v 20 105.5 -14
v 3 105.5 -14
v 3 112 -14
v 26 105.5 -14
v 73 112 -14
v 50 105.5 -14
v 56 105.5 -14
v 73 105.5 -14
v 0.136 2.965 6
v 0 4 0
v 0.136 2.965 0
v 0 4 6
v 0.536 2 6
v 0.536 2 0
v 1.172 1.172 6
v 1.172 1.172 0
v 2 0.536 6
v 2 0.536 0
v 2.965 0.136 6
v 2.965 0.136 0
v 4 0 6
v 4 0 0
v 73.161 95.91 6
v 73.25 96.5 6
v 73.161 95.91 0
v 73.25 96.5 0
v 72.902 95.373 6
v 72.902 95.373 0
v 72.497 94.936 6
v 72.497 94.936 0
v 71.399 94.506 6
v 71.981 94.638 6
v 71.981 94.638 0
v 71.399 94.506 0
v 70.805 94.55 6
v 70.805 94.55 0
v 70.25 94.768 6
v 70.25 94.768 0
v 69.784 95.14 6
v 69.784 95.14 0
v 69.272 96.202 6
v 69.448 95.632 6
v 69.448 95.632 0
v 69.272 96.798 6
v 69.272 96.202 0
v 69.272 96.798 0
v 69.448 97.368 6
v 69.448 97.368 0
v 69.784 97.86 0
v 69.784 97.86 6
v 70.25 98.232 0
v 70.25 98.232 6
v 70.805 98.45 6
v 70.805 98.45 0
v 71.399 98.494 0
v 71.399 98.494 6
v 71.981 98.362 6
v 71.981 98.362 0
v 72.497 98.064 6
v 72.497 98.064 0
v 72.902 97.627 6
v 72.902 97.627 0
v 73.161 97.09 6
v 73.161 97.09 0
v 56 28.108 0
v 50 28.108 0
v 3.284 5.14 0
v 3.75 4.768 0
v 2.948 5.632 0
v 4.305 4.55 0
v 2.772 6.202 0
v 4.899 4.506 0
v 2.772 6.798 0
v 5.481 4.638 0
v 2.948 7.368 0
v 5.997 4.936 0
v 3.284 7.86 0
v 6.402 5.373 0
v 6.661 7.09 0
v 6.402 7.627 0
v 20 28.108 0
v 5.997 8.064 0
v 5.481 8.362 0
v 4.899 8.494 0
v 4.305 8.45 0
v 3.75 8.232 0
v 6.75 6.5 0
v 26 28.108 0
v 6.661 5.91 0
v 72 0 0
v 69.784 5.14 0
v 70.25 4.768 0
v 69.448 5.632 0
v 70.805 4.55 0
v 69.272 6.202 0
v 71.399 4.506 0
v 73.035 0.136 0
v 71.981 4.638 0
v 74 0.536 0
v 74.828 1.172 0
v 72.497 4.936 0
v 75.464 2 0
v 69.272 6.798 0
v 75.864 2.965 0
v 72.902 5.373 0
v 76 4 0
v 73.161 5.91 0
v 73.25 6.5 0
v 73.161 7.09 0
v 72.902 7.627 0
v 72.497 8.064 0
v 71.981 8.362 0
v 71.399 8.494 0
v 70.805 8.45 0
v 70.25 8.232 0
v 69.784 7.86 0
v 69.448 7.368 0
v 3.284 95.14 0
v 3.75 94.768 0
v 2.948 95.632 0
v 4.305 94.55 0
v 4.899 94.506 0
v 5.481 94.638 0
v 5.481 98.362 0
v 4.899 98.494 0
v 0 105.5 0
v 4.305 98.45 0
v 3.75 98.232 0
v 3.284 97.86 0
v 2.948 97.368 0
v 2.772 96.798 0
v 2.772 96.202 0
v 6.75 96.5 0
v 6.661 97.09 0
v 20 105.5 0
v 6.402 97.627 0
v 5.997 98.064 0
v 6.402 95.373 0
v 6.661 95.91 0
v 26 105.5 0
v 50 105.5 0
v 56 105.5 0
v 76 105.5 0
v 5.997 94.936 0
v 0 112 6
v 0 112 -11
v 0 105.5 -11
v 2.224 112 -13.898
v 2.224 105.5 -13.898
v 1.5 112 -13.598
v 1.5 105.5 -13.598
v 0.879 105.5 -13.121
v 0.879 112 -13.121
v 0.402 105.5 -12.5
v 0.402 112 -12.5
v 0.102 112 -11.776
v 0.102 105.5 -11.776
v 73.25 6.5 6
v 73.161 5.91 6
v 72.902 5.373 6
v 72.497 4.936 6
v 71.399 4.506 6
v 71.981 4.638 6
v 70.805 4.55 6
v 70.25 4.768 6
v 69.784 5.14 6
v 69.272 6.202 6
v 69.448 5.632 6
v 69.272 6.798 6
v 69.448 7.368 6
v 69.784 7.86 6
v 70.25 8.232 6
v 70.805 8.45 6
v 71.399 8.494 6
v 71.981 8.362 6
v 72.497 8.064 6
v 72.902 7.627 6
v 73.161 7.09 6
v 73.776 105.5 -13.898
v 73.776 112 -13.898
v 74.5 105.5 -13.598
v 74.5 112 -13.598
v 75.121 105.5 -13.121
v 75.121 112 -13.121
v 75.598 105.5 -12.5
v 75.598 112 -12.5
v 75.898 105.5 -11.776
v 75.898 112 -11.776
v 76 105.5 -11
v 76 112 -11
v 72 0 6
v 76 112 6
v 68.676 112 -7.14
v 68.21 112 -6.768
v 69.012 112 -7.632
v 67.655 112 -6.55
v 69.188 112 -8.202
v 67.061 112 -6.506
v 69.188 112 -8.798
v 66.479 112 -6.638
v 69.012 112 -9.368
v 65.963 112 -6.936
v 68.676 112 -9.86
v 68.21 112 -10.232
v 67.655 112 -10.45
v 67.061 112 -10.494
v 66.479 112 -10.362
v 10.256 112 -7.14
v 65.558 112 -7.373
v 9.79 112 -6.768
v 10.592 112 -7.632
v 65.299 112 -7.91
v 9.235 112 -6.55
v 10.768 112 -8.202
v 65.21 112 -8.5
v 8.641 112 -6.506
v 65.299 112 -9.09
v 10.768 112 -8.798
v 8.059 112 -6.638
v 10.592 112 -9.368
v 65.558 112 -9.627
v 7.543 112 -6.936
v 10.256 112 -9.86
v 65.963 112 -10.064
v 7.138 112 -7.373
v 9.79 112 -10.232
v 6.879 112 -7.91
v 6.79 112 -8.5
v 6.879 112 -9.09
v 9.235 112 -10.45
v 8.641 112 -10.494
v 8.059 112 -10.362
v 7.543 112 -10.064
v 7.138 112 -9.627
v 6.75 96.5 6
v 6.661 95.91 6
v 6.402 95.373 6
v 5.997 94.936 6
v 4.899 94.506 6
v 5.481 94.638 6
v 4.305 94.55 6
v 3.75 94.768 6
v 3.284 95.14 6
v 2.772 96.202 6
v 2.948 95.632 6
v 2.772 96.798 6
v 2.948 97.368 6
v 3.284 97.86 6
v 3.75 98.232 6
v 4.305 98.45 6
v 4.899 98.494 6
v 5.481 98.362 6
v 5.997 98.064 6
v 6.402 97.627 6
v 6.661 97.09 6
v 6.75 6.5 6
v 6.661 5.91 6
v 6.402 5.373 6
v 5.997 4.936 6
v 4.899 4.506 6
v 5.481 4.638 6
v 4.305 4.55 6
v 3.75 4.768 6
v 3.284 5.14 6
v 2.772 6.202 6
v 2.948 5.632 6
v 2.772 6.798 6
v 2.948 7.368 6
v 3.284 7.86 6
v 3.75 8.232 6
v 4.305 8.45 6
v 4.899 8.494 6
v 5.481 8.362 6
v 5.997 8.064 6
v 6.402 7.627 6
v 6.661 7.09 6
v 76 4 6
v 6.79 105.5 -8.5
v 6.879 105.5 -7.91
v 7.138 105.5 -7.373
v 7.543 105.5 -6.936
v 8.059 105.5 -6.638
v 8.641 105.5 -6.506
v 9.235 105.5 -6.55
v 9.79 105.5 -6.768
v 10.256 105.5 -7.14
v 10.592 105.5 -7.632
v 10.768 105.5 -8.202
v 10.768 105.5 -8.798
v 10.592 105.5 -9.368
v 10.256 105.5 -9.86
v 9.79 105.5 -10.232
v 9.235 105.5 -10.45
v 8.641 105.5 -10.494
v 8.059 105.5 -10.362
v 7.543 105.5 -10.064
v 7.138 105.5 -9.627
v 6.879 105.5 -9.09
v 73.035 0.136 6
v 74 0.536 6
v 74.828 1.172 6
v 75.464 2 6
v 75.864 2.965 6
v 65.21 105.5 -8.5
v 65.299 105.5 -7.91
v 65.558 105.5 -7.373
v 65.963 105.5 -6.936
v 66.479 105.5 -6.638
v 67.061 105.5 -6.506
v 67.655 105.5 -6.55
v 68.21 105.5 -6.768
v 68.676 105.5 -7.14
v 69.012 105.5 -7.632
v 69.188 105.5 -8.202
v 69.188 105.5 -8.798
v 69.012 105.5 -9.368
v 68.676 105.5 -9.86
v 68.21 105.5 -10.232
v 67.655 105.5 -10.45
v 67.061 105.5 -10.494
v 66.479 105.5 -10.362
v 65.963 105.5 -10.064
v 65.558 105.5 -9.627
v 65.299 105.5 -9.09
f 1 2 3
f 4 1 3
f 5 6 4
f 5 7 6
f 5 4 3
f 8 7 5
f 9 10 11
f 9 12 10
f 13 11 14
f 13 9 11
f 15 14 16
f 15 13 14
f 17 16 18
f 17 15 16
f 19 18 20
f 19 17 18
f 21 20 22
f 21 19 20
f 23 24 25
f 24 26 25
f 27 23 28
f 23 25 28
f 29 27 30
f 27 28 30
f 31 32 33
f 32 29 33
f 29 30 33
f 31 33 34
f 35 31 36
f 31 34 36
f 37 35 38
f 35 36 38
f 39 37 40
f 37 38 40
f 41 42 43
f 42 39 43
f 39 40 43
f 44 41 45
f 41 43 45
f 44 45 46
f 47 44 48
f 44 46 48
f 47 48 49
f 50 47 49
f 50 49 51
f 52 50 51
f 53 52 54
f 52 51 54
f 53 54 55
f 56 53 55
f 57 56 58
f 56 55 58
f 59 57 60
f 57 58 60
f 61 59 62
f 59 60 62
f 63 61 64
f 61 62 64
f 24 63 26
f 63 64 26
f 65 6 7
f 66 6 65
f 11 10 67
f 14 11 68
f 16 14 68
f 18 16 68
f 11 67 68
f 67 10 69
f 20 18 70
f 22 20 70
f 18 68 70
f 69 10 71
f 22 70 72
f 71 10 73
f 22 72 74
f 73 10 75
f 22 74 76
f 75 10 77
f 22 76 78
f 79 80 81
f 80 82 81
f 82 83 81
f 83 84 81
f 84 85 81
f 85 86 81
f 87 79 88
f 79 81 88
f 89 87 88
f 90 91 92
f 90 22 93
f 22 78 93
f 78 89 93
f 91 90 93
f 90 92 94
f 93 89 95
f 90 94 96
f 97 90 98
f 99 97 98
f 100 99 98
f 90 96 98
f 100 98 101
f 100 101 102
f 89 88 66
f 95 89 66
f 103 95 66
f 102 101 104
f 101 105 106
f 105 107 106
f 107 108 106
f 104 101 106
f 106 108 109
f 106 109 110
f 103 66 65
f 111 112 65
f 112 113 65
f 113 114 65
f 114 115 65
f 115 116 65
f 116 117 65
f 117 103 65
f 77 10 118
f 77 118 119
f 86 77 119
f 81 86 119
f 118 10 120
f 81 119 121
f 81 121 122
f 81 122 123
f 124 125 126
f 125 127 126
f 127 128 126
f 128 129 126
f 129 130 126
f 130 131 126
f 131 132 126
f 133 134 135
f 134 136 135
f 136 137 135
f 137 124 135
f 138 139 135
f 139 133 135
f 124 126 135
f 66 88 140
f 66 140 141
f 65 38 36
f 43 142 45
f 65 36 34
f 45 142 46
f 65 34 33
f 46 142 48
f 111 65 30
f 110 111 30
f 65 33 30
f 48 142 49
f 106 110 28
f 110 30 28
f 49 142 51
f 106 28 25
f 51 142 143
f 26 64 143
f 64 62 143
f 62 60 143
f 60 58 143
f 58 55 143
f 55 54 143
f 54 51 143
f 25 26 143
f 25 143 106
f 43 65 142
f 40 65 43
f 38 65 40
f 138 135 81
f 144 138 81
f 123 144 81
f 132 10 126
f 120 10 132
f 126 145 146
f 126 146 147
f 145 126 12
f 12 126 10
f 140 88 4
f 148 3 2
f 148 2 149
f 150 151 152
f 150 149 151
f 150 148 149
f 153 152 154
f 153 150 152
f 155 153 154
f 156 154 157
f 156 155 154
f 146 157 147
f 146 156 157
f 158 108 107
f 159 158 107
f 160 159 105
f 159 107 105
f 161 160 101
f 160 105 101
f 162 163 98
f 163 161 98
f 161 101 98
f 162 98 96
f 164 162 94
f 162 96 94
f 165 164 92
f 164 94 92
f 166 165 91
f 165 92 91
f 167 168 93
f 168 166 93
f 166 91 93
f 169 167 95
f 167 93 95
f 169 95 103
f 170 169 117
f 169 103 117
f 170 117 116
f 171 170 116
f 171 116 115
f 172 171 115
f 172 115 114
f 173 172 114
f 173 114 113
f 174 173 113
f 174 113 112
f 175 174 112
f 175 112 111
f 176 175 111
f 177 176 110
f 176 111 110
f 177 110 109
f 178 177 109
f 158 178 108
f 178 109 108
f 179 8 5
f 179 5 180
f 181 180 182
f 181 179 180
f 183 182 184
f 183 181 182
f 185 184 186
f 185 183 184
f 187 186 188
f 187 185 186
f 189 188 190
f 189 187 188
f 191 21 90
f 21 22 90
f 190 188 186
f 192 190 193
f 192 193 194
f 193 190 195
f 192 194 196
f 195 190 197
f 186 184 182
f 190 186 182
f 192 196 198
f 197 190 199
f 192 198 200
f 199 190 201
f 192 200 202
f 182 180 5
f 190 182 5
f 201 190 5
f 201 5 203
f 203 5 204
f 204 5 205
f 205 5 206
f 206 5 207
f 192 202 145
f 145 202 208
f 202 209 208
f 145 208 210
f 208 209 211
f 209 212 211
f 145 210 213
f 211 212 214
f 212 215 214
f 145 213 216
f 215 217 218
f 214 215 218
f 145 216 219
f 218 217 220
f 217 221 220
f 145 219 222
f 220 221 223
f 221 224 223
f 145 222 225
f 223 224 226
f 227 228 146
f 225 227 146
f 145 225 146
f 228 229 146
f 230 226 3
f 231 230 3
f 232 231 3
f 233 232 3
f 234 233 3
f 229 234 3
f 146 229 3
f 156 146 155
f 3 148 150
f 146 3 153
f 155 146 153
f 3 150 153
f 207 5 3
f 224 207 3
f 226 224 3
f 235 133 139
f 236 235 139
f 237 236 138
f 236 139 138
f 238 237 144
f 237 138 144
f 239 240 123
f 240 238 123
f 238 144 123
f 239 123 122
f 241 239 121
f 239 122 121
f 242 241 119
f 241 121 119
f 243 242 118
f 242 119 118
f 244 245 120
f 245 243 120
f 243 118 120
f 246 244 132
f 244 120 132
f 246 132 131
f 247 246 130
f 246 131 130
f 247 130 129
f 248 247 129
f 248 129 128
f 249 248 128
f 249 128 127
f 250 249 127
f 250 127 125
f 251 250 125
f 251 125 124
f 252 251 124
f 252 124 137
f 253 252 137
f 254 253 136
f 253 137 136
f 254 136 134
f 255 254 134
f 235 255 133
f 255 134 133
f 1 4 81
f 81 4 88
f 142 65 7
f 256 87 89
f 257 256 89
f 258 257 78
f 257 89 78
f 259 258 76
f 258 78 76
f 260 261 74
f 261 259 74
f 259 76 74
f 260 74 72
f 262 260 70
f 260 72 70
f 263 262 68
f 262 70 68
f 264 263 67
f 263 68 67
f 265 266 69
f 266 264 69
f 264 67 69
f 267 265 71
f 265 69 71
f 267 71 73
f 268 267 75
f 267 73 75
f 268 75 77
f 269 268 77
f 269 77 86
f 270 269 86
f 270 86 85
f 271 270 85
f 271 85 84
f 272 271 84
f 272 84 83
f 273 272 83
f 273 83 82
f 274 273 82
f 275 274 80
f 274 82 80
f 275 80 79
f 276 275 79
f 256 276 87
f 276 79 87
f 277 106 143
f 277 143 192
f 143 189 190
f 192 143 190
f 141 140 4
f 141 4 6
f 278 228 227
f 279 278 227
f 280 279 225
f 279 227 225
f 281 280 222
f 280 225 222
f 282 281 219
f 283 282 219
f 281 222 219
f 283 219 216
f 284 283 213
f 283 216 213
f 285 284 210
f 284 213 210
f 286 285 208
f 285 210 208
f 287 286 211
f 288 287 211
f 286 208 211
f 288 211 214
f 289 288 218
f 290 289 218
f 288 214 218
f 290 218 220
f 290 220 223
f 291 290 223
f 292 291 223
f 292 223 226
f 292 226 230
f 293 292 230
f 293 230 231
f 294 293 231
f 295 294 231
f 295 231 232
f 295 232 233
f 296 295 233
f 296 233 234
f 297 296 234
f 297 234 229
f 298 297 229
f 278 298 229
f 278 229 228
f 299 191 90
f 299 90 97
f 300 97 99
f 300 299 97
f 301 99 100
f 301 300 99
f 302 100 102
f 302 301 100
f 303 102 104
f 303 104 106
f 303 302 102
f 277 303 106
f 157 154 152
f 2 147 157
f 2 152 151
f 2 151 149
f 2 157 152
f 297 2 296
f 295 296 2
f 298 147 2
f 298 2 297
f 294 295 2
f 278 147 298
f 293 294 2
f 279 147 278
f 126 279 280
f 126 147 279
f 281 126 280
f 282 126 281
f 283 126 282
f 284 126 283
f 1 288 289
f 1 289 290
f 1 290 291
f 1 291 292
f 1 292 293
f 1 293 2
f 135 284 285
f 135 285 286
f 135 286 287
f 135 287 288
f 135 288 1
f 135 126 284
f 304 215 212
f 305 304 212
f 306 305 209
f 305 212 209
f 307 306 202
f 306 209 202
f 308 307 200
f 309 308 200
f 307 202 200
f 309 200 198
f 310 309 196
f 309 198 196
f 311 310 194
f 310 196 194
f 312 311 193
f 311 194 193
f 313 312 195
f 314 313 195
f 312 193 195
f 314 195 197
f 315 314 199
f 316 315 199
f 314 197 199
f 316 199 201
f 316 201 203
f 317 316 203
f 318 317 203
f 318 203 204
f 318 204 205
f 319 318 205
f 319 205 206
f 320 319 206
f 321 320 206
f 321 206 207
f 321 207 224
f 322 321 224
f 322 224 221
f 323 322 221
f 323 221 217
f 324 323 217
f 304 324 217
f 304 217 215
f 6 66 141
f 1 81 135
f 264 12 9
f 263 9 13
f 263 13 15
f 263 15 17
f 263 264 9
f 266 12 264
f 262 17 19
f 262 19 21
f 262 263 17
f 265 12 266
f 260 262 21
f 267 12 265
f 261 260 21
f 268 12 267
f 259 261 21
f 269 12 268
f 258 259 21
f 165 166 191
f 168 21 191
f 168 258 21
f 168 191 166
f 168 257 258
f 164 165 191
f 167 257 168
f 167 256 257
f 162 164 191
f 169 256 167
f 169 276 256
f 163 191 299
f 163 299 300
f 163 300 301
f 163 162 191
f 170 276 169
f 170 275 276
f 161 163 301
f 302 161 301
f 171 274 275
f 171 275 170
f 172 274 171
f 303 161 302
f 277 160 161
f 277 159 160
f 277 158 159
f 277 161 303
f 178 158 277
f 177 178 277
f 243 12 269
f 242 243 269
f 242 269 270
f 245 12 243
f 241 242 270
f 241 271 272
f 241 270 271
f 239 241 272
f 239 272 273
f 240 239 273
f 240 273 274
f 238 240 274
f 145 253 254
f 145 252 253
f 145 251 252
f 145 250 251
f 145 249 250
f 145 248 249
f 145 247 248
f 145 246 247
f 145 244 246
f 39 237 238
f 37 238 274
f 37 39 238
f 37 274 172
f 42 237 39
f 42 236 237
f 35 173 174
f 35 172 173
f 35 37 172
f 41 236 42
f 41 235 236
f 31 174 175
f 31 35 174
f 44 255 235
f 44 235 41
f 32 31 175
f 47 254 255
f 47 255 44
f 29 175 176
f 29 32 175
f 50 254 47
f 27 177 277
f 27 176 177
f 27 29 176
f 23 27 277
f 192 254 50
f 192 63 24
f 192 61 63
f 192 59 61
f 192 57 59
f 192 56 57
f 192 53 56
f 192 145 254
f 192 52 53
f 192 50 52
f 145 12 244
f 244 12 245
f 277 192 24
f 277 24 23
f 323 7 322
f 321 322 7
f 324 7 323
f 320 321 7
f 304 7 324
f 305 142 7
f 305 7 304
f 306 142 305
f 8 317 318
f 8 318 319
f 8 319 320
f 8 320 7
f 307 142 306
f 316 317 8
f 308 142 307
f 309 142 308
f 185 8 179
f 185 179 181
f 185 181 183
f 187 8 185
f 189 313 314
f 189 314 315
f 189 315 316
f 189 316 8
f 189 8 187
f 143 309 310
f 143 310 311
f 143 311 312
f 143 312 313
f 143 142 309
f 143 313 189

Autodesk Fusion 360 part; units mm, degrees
sketch "Sketch1" plane through (0, 0, 0) normal (0, 0, 1) x (1, 0, 0)
  line L0 (0, 0) -> (76, 0)
  line L1 (76, 0) -> (76, 112)
  line L2 (76, 112) -> (0, 112)
  line L3 (0, 112) -> (0, 0)
  circle A0 centre (4.75, 96.5) radius 2
  circle A1 centre (71.25, 96.5) radius 2
  circle A2 centre (71.25, 6.5) radius 2
  circle A3 centre (4.75, 6.5) radius 2
  line L4 (4.75, 96.5) -> (71.25, 96.5) construction
  line L5 (71.25, 96.5) -> (71.25, 6.5) construction
  line L6 (38, 112) -> (38, 0) construction
  dimension "d1" = 76
  dimension "d2" = 112
  dimension "d3" = 66.5
  dimension "d4" = 90
  dimension "d5" = 66.5
  dimension "d6" = 90
  dimension "d7" = 4
  dimension "d8" = 4
  dimension "d9" = 4
  dimension "d10" = 4
  dimension "d11" = 6.5
extrude "Extrude1" add sketch "Sketch1" along normal blind 6
sketch "Sketch2" plane through (0, 0, 0) normal (0, 0, -1) x (1, 0, 0)
  circle A0 centre (71.25, -96.5) radius 2
  circle A1 centre (4.75, -96.5) radius 2
  circle A2 centre (71.25, -6.5) radius 2
  circle A3 centre (4.75, -6.5) radius 2
  line L0 (0, 0) -> (0, -112)
  line L1 (0, -112) -> (76, -112)
  line L2 (76, -112) -> (76, 0)
  line L3 (76, 0) -> (0, 0)
  line L4 (76, -112) -> (0, -112)
  line L5 (0, -112) -> (0, -105.5)
  line L6 (0, -105.5) -> (76, -105.5)
  line L7 (76, -105.5) -> (76, -112)
  dimension "d14" = 6.5
extrude "Extrude2" add sketch "Sketch2" along normal blind 14 contours L0 L1 L2 L4 L5 L6 L7
ref_plane "WorkPlane1" through (53, 56, -4) normal (1, 0, 0) x (0, 1, 0)
sketch "Sketch3" plane through (53, 56, -4) normal (1, 0, 0) x (0, 1, 0)
  line L0 (-56, 4) -> (49.5, 4)
  line L1 (49.5, 4) -> (49.5, -10)
  line L2 (49.5, -10) -> (56, -10)
  line L3 (56, -10) -> (56, 10)
  line L4 (56, 10) -> (-56, 10)
  line L5 (-56, 10) -> (-56, 4)
  line L6 (-56, 4) -> (49.5, 4)
  line L7 (49.5, -10) -> (-27.892, 4)
extrude "Extrude3" add sketch "Sketch3" along normal mid plane 6 contours L0 L1 L6 L7
ref_plane "WorkPlane2" through (23, 56, -4) normal (-1, 0, 0) x (0, -1, 0)
sketch "Sketch4" plane through (23, 56, -4) normal (-1, 0, 0) x (0, 1, 0)
  line L0 (49.5, -4) -> (49.5, 10)
  line L1 (49.5, 10) -> (-27.892, -4)
  line L2 (-27.892, -4) -> (49.5, -4)
  line L3 (49.5, 10) -> (-27.892, -4)
extrude "Extrude4" add sketch "Sketch4" along normal mid plane 6
sketch "Sketch5" plane through (0, 112, 0) normal (0, 1, 0) x (-1, 0, 0)
  line L0 (0, -14) -> (0, 6)
  line L1 (0, 6) -> (-76, 6)
  line L2 (-76, 6) -> (-76, -14)
  line L3 (-76, -14) -> (0, -14)
  circle A0 centre (-67.21, -8.5) radius 2
  line L4 (-38, 6) -> (-38, -14) construction
  circle A1 centre (-8.79, -8.5) radius 2
  dimension "d23" = 4
  dimension "d24" = 4
  dimension "d25" = 58.42
  dimension "d26" = 5.5
extrude "Extrude5" cut sketch "Sketch5" against normal blind 6.5 contours A0 | A1
fillet "Fillet1" radius 4 2 edges at (76, 0, 3) (0, 0, 3)
fillet "Fillet2" radius 3 2 edges at (0, 108.75, -14) (76, 108.75, -14)
